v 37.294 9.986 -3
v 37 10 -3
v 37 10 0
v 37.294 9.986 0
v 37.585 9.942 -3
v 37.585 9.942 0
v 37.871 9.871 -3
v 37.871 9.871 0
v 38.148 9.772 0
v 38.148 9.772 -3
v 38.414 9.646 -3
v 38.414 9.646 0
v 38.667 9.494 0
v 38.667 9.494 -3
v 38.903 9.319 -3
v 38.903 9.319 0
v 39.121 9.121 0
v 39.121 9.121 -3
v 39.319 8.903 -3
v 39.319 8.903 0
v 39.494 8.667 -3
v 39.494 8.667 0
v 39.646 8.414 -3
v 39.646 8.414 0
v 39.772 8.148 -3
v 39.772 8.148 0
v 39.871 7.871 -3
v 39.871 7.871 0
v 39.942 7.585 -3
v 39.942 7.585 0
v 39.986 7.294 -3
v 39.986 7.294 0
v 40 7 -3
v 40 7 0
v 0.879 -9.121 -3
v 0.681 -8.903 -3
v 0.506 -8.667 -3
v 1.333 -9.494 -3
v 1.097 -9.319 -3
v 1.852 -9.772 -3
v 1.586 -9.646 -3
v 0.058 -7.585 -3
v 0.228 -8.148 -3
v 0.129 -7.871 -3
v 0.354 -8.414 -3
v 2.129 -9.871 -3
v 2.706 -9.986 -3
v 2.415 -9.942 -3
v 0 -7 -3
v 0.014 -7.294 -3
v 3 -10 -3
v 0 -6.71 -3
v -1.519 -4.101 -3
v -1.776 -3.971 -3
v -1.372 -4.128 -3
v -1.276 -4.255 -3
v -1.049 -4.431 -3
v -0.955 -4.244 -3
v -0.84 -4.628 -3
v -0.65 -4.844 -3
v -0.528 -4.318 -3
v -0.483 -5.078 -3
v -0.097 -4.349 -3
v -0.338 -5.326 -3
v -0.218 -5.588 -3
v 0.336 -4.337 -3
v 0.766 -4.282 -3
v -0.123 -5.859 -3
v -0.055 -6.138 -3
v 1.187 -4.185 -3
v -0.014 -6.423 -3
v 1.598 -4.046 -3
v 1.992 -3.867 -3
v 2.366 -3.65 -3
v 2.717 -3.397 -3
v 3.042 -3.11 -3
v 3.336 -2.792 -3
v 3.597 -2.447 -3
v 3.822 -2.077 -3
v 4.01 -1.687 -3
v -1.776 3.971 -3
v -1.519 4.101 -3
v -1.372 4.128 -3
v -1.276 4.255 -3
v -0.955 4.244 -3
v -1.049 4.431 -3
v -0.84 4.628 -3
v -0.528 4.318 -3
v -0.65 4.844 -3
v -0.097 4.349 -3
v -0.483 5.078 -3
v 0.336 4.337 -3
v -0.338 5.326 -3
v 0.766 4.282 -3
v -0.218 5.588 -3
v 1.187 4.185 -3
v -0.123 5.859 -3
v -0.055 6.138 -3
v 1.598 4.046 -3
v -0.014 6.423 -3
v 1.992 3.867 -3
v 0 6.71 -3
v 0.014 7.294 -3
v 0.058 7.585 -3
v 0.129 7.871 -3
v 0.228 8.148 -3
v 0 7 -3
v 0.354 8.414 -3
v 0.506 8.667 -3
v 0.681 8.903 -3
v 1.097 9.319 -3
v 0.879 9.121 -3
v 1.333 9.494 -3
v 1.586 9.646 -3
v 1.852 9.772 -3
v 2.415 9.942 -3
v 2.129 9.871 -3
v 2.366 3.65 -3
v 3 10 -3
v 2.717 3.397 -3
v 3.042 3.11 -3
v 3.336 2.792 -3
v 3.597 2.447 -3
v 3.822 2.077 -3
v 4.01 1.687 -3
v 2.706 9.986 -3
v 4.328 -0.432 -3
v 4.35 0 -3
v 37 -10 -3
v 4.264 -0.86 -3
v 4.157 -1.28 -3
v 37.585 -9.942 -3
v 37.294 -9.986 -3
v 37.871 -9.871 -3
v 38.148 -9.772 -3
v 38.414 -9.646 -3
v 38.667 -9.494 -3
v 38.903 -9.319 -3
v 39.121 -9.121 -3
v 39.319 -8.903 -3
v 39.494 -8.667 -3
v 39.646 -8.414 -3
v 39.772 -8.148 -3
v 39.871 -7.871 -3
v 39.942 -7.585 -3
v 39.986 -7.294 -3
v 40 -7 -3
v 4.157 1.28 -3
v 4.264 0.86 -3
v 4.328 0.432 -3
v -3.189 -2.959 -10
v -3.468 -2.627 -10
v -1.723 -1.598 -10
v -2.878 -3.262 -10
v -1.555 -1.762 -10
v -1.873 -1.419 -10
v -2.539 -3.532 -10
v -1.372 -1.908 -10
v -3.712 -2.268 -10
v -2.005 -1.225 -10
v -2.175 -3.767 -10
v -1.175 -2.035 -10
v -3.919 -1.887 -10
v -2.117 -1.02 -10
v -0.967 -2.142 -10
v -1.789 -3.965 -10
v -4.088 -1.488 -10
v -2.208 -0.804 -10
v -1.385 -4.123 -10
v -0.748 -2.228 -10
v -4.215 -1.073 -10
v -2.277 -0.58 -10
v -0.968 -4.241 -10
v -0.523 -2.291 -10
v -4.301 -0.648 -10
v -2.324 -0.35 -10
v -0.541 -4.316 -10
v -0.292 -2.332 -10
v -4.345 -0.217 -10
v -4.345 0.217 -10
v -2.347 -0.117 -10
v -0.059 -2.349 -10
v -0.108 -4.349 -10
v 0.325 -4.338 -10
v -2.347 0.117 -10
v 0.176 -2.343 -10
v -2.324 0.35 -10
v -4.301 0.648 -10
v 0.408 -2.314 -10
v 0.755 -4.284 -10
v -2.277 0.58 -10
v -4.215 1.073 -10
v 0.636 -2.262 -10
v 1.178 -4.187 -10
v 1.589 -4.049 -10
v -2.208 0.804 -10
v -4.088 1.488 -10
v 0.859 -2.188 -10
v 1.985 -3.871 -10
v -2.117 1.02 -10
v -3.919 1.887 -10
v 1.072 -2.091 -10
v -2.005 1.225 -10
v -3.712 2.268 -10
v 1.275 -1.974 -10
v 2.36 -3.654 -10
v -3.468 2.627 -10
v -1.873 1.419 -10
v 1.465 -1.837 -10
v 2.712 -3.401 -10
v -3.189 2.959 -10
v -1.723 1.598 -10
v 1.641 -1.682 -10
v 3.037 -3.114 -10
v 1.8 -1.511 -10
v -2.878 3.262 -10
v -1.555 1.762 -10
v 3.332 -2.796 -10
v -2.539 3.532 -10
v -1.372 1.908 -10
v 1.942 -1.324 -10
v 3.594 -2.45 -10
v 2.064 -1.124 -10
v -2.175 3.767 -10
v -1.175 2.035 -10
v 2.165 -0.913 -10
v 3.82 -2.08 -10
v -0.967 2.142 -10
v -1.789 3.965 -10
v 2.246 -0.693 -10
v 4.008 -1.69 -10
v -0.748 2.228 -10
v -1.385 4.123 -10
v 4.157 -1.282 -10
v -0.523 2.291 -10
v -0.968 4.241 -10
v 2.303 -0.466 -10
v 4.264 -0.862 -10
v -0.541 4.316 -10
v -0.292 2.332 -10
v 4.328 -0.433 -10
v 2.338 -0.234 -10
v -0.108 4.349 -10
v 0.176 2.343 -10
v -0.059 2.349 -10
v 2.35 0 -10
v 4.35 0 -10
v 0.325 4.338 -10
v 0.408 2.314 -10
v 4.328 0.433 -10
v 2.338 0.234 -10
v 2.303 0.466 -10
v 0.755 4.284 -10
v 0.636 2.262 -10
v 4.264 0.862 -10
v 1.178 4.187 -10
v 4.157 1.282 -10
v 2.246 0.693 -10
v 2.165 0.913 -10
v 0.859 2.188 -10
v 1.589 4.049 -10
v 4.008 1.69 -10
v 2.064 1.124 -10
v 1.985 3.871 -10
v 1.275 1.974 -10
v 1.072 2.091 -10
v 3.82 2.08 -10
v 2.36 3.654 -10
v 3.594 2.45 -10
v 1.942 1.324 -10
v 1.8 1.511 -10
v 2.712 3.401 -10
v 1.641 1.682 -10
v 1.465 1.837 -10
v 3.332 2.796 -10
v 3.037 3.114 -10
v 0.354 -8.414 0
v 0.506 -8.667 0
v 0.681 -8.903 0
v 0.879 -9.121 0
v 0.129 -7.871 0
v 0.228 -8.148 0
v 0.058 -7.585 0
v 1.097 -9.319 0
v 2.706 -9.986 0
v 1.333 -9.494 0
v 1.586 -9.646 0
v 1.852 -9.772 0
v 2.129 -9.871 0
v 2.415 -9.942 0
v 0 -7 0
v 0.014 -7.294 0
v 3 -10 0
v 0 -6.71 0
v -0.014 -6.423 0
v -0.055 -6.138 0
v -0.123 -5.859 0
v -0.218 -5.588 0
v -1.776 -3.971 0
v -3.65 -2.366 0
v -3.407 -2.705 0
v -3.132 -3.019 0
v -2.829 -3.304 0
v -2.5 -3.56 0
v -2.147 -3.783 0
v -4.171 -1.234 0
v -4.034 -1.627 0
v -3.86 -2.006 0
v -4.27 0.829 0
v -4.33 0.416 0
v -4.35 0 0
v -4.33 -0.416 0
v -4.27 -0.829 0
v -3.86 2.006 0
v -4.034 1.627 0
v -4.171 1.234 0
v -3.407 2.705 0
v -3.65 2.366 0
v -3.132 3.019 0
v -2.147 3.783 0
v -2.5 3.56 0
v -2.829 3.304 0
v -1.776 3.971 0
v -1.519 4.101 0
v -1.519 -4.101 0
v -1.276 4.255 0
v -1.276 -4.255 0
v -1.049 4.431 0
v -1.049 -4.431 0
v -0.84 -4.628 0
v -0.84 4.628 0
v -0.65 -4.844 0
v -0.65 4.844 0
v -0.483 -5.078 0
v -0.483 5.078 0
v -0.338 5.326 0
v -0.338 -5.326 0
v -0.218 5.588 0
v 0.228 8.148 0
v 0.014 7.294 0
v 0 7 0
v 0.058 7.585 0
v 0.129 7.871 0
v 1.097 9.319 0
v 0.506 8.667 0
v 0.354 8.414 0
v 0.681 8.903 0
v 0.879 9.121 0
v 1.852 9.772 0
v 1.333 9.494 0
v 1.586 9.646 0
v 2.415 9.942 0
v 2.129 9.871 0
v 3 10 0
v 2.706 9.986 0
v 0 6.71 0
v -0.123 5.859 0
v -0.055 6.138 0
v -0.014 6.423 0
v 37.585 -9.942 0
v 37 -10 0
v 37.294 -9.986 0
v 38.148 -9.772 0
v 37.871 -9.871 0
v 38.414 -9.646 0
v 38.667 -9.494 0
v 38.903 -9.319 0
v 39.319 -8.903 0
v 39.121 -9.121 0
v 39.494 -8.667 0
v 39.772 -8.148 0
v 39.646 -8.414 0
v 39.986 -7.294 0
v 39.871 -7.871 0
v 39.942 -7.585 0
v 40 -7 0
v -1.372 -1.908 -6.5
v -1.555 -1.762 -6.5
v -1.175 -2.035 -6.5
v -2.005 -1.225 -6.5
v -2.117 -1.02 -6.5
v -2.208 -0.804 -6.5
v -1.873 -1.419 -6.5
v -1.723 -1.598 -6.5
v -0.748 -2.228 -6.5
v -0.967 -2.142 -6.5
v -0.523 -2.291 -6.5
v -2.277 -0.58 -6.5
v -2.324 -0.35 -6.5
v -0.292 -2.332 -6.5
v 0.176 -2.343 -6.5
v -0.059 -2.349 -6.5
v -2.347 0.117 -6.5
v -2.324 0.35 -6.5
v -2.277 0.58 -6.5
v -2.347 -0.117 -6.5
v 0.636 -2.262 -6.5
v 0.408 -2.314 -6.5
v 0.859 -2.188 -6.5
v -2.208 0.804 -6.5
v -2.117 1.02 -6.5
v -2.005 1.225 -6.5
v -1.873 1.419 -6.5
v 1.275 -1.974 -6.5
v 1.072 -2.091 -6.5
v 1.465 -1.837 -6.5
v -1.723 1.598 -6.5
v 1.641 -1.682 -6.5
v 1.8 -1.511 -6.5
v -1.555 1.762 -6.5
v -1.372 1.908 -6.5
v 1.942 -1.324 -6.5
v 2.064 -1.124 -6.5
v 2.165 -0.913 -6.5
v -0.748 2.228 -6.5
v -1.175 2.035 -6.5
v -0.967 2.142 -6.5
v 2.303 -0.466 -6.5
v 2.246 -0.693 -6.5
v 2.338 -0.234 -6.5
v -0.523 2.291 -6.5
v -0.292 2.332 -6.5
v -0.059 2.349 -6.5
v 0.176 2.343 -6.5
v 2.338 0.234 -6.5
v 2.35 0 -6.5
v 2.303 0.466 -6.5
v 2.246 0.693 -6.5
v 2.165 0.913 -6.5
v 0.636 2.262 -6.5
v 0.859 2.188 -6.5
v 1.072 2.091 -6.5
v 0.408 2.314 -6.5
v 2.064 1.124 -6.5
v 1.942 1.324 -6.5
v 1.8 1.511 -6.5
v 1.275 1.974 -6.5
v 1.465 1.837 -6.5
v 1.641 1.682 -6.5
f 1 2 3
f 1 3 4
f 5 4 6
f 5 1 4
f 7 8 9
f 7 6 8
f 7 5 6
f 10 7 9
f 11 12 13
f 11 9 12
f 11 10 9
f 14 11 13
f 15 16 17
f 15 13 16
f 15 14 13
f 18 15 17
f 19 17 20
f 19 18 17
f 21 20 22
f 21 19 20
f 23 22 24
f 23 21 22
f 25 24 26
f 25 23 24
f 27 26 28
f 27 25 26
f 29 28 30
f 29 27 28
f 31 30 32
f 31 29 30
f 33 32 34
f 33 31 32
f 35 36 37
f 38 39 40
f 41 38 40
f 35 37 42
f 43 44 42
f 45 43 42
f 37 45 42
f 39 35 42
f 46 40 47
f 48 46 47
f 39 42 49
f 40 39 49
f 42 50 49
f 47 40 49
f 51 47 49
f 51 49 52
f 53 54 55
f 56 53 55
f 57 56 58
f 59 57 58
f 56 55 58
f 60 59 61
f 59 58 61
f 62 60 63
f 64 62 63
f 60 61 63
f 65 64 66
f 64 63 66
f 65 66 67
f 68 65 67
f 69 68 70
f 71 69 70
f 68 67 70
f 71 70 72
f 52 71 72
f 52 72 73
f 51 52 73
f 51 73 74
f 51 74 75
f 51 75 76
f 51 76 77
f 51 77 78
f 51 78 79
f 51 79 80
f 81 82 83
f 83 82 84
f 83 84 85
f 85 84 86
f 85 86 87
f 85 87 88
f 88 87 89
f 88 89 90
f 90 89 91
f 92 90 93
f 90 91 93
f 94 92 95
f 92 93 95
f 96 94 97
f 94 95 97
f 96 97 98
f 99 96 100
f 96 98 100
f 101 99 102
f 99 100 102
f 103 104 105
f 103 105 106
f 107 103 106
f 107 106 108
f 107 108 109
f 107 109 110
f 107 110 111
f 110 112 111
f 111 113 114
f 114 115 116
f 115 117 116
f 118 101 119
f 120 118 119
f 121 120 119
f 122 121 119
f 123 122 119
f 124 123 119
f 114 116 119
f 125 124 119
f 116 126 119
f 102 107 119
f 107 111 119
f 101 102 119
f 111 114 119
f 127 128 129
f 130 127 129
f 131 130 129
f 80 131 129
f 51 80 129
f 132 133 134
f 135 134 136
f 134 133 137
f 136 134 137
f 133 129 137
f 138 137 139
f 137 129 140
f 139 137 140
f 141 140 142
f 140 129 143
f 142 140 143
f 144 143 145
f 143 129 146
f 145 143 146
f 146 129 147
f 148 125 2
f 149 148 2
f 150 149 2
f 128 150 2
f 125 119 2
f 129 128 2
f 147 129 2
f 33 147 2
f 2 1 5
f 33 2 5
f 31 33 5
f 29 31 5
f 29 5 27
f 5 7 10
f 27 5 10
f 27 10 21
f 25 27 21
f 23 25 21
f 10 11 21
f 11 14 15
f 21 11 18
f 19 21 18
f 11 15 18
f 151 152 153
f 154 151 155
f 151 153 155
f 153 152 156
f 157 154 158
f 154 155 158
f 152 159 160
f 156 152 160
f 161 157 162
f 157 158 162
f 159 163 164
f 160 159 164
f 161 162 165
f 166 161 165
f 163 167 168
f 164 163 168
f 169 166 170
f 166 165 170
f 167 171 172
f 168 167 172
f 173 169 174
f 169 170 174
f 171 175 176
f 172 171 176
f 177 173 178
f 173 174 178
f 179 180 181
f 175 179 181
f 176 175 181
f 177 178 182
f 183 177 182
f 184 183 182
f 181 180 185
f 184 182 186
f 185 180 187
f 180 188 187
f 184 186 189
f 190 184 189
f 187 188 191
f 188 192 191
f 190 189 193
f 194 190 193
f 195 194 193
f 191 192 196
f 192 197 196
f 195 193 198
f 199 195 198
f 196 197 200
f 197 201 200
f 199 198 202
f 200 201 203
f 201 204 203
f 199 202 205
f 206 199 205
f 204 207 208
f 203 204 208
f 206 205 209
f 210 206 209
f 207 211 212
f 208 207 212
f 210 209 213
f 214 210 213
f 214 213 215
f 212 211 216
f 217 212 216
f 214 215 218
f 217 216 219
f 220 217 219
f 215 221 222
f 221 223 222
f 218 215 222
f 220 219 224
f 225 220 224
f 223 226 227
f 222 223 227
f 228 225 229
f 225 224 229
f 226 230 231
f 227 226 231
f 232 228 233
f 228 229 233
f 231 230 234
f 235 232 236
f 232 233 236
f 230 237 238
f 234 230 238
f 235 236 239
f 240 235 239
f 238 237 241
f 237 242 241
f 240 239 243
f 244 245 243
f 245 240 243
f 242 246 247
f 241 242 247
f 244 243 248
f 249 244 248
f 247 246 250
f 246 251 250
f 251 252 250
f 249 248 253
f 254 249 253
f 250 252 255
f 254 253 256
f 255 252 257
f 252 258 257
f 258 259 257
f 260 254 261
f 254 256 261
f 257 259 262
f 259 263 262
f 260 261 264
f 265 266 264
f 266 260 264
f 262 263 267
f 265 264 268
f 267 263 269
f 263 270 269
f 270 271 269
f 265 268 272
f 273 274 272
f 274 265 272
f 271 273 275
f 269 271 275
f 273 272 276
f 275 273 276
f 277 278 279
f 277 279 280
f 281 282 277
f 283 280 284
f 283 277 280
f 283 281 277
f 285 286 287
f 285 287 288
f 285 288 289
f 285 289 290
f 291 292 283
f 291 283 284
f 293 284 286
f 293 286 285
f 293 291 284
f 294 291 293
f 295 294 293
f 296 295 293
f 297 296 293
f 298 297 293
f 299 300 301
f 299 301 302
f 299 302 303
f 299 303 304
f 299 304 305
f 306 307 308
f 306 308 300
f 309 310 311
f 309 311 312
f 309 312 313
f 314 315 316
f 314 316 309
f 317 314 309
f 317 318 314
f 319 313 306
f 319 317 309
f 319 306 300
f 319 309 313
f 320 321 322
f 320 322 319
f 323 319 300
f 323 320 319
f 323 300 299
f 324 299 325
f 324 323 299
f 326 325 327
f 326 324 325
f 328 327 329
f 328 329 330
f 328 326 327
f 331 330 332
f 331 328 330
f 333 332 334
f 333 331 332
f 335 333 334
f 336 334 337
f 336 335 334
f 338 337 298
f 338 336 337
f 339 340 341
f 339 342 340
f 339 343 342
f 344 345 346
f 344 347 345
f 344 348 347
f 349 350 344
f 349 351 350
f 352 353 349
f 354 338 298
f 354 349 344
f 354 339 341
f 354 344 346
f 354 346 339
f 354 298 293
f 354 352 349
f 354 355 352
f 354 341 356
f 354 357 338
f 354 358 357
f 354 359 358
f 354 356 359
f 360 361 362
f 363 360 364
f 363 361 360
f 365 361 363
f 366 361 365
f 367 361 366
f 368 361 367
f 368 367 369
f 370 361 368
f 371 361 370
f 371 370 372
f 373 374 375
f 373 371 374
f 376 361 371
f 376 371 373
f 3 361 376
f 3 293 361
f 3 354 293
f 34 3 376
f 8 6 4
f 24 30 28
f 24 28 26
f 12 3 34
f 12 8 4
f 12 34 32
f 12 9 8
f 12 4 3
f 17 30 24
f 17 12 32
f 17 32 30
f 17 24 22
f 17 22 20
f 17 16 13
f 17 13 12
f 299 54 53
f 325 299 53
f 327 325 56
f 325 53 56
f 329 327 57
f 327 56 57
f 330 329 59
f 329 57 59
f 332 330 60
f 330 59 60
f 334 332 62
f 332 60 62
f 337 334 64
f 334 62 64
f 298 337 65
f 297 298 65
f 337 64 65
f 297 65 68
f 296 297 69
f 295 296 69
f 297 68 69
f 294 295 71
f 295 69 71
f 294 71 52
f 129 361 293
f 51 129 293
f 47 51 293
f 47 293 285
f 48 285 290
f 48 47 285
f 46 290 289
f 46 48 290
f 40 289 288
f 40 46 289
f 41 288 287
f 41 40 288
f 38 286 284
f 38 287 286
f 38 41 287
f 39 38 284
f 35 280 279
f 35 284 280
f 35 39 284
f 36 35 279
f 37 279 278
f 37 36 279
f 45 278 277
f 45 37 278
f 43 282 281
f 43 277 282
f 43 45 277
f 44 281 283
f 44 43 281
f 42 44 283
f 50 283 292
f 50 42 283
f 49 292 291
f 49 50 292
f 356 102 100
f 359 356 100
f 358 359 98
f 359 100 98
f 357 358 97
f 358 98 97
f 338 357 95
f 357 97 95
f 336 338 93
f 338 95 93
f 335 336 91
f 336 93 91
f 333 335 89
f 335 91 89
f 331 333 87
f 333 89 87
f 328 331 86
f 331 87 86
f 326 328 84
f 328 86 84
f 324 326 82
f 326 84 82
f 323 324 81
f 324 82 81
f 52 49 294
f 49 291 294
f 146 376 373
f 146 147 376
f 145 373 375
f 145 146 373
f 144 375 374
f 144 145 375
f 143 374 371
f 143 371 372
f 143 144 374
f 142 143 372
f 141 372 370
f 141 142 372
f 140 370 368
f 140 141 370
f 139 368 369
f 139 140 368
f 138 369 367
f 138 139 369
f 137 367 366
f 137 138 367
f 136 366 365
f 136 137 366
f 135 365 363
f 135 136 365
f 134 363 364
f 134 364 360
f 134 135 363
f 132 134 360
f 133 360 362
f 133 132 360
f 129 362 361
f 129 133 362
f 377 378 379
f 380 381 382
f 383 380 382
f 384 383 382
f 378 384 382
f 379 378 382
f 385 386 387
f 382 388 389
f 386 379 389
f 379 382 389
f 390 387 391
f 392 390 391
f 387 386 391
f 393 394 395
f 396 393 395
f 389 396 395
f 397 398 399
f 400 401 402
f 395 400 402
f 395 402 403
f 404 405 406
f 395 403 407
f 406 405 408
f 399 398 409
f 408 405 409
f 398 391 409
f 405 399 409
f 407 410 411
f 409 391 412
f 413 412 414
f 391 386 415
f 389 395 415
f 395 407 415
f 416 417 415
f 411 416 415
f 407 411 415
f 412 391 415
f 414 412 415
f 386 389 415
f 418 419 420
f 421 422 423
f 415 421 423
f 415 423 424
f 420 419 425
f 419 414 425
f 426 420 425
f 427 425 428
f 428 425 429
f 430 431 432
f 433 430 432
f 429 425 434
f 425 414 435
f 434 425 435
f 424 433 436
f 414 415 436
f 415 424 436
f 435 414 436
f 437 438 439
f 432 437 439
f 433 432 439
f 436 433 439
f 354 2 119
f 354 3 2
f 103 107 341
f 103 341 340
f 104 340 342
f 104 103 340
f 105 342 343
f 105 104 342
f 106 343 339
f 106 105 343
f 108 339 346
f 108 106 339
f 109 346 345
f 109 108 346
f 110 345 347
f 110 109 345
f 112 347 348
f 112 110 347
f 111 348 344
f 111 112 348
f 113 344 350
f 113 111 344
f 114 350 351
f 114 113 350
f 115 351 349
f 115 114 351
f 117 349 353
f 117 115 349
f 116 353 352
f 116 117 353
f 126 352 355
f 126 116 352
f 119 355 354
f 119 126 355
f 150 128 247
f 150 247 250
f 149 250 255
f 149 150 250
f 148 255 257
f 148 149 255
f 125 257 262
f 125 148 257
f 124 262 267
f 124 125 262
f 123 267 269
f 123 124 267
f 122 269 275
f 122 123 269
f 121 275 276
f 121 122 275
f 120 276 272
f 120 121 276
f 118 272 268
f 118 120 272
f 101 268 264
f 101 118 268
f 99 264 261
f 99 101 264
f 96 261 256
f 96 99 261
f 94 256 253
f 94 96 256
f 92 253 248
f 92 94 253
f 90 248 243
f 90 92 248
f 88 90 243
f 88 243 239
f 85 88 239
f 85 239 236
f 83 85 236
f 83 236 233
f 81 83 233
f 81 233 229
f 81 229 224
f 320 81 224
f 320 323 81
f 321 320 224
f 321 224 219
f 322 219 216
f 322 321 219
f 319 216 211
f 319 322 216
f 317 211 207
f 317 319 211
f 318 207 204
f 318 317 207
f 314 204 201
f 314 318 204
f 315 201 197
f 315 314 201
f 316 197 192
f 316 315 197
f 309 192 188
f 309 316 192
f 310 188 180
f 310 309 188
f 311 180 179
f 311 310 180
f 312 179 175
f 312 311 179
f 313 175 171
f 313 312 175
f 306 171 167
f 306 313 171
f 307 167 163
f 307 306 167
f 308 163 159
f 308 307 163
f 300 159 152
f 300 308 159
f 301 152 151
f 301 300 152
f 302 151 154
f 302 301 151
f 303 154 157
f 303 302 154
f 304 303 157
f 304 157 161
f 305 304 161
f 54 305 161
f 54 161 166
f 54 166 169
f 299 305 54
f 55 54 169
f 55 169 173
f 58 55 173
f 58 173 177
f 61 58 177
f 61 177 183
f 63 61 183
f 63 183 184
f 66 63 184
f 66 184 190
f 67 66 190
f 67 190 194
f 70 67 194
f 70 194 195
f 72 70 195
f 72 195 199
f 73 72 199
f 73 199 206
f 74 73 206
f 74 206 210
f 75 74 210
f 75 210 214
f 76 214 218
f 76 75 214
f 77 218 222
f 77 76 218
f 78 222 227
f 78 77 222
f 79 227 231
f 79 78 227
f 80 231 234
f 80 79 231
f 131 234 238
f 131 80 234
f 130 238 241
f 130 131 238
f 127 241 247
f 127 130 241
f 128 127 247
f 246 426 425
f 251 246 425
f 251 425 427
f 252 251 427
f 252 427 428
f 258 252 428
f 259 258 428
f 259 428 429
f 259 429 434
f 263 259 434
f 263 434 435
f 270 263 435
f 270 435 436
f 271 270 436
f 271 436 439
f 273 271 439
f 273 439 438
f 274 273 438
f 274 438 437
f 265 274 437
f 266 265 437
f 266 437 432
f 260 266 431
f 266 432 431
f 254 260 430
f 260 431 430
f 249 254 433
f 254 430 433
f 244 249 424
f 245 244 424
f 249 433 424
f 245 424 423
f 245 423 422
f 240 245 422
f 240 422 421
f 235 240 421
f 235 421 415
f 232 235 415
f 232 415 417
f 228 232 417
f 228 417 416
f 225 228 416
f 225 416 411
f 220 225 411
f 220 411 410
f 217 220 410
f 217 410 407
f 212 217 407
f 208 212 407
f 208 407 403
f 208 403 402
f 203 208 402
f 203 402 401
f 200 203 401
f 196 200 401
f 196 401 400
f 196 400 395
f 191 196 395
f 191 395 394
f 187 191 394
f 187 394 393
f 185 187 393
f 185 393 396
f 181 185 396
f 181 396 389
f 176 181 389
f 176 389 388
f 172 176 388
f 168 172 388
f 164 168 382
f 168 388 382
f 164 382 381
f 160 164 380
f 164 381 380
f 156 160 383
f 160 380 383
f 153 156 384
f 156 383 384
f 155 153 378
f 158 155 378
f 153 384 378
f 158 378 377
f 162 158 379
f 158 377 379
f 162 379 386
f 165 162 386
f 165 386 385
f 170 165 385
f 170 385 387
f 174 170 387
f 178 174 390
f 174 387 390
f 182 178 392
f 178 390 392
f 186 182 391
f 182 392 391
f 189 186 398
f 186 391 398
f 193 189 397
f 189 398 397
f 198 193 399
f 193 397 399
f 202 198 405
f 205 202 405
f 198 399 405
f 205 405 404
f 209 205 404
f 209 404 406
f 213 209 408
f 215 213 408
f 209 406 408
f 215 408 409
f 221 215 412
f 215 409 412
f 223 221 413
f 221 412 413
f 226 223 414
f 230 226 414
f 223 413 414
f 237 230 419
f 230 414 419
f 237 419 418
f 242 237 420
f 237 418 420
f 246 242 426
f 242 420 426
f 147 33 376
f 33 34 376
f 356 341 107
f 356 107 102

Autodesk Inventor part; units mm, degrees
ref_plane "YZ Plane" through (0, 0, 0) normal (1, 0, 0) x (0, 1, 0)
ref_plane "XZ Plane" through (0, 0, 0) normal (0, 1, 0) x (-1, 0, 0)
ref_plane "XY Plane" through (0, 0, 0) normal (0, 0, 1) x (1, 0, 0)
sketch "Sketch3" plane through (0, 0, 0) normal (0, 0, 1) x (1, 0, 0)
  circle A0 centre (0, 0) radius 2.35
  circle A1 centre (0, 0) radius 4.35
  dimension "d8" = 4.7
  dimension "d9" = 2
extrude "Extrusion3" add sketch "Sketch3" against normal blind 10
sketch "Sketch4" plane through (0, 0, 0) normal (0, 0, 1) x (1, 0, 0)
  circle A0 centre (0, 0) radius 4.35 projected
  circle A1 centre (0, 0) radius 2.35 projected
  line L0 (0, 0) -> (40, 0)
  line L1 (40, 0) -> (40, 10)
  line L2 (40, 10) -> (0, 10)
  line L3 (0, 10) -> (0, 0)
  line L4 (40, 0) -> (40, -10)
  line L5 (40, -10) -> (0, -10)
  line L6 (0, -10) -> (0, 0)
  point P0 (0, 4.35)
  point P1 (0, -4.35)
  dimension "d12" = 40
  dimension "d13" = 10
extrude "Extrusion4" add sketch "Sketch4" against normal blind 3 contours L0 L4 L5 L6 A0 | A0 L3 L2 L1 L0
fillet "Fillet1" radius 3 6 edges at (0, -4.35, -1.5) (0, 4.35, -1.5) (0, -10, -1.5) (0, 10, -1.5) (40, 10, -1.5) (40, -10, -1.5)
sketch "Sketch5" plane through (0, 0, 0) normal (0, 0, 1) x (1, 0, 0)
  circle A0 centre (0, 0) radius 2.35 projected
extrude "Extrusion5" add sketch "Sketch5" against normal blind 6.5
sketch "Sketch6" plane through (0, 0, -3) normal (0, 0, -1) x (-1, 0, 0)
  arc A0 (-40, -7) -> (-37, -10) centre (-37, -7) ccw projected
  line L0 (-37, -10) -> (-3, -10) projected
  arc A1 (-3, -10) -> (0, -7) centre (-3, -7) ccw projected
  line L1 (0, -7) -> (0, -6.7099) projected
  arc A2 (1.7755, -3.9712) -> (0, -6.7099) centre (3, -6.7099) ccw projected
  arc A3 (1.7755, 3.9712) -> (1.7755, -3.9712) centre (0, 0) ccw projected
  arc A4 (0, 6.7099) -> (1.7755, 3.9712) centre (3, 6.7099) ccw projected
  line L2 (0, 6.7099) -> (0, 7) projected
  arc A5 (0, 7) -> (-3, 10) centre (-3, 7) ccw projected
  line L3 (-3, 10) -> (-37, 10) projected
  arc A6 (-37, 10) -> (-40, 7) centre (-37, 7) ccw projected
  line L4 (-40, 7) -> (-40, -7) projected
  line L5 (-20, -10) -> (-20, 10)
  line L6 (-40, 0) -> (-20, 0)
  circle A7 centre (-30, 0) radius 5.279
  dimension "d19" = 10.558
properties part number "TutupTank"
